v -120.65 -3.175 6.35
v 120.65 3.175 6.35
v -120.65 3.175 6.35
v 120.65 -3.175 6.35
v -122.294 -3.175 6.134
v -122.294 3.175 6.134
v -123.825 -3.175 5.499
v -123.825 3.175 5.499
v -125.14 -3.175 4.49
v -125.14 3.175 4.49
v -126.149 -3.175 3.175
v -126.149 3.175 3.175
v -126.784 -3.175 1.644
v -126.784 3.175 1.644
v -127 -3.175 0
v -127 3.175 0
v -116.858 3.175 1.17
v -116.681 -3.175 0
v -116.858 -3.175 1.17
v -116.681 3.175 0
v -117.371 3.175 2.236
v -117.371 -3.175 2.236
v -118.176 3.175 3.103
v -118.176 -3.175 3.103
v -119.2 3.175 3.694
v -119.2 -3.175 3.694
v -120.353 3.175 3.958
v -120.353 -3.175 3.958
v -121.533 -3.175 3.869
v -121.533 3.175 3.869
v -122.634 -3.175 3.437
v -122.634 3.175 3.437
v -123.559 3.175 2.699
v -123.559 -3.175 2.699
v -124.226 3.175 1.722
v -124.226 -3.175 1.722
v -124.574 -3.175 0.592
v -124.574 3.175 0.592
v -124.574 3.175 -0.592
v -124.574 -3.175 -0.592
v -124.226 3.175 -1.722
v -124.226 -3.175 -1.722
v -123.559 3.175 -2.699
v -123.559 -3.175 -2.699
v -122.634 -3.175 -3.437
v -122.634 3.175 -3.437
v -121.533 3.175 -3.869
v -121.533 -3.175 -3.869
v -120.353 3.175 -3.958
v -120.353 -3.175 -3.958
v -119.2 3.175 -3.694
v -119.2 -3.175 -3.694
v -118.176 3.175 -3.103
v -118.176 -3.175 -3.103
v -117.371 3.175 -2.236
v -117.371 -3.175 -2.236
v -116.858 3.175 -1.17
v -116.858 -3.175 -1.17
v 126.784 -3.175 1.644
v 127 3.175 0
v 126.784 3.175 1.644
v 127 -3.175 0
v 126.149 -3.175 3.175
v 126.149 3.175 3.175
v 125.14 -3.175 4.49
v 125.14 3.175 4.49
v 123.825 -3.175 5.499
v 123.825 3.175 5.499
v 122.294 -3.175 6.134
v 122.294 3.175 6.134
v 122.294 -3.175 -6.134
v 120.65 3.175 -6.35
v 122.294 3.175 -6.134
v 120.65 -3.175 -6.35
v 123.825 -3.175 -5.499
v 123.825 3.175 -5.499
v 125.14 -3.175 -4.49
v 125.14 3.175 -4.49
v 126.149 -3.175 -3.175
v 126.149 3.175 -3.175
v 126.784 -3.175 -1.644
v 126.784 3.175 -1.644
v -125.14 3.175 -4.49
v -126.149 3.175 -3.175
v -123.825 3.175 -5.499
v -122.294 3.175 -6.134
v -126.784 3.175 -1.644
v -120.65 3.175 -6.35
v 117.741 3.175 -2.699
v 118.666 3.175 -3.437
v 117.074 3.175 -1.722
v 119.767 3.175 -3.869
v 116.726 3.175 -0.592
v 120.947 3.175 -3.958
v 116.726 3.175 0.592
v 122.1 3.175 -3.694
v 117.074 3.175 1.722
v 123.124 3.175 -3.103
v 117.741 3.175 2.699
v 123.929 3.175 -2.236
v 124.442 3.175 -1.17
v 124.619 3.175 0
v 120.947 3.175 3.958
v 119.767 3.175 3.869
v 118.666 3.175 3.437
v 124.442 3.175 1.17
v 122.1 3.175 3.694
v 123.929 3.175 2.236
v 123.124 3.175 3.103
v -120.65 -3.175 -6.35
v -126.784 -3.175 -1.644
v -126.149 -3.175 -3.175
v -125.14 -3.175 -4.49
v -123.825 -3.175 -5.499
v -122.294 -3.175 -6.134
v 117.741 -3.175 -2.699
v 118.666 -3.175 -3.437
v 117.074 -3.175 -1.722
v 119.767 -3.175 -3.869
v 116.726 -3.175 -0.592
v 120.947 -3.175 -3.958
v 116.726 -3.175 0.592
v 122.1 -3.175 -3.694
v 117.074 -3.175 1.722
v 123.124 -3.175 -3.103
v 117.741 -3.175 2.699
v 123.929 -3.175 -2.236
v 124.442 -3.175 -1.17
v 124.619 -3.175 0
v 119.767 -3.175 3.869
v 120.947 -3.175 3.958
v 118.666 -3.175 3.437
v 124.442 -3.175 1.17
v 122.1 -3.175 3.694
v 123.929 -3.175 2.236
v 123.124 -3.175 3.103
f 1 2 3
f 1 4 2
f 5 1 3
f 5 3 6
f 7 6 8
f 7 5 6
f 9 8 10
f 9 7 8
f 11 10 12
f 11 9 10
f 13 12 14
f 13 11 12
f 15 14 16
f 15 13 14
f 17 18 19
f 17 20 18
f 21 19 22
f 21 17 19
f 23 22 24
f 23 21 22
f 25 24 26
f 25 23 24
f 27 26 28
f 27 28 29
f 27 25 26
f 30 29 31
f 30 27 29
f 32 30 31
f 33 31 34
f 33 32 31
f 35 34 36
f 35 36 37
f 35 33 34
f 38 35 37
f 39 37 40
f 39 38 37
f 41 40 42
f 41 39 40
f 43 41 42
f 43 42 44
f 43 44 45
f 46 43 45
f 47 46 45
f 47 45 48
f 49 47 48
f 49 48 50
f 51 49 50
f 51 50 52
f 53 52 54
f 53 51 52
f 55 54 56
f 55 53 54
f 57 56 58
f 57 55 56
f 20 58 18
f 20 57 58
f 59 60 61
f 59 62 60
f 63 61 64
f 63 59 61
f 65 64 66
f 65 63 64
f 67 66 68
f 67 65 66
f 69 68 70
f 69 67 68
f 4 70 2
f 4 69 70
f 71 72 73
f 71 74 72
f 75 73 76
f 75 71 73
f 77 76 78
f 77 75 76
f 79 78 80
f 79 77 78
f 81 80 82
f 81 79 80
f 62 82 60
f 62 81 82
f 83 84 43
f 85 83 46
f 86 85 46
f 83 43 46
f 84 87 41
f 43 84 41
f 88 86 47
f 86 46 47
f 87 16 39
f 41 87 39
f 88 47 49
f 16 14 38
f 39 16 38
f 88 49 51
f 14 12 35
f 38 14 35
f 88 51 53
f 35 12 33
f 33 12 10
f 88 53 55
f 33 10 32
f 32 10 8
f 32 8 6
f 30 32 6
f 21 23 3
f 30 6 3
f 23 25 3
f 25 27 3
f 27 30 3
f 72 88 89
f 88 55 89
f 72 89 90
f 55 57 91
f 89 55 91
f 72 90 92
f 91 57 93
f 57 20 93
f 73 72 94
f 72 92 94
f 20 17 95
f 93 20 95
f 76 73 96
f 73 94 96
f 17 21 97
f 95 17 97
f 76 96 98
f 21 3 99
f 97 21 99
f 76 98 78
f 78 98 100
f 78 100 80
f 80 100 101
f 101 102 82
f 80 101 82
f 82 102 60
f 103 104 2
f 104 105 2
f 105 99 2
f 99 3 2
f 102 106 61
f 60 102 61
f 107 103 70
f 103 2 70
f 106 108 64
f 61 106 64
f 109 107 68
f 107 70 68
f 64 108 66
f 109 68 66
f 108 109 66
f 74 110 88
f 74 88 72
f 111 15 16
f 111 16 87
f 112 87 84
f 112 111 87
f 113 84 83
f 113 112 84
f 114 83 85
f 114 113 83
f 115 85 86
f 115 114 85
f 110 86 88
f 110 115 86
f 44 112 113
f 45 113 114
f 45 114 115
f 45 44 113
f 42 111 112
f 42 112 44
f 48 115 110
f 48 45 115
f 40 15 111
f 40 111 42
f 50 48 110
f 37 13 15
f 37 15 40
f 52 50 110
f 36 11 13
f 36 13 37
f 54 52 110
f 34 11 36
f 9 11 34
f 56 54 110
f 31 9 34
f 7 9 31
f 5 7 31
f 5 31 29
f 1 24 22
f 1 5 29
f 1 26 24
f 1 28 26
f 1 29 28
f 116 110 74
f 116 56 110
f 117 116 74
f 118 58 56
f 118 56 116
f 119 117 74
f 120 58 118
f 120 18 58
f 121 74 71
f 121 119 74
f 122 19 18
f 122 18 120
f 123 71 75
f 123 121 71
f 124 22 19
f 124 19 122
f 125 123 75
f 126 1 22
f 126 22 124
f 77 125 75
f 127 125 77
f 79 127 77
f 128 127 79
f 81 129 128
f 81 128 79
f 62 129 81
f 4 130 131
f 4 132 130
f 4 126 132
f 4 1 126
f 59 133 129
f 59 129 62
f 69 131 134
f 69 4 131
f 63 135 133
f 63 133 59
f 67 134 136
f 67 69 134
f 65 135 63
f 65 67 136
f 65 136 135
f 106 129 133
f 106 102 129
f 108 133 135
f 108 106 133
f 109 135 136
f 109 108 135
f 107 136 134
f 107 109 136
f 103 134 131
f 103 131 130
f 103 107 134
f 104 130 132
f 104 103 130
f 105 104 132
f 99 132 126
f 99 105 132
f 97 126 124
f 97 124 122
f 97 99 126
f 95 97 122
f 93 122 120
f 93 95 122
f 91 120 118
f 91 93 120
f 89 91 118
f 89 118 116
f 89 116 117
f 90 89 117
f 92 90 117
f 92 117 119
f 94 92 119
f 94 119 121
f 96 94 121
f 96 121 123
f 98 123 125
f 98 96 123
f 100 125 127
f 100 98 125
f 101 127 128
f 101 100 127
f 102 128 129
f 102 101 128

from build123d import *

# Parameters (mm, degrees)
F0_R     = 3.96875
F1_DEPTH = 3.175


with BuildPart() as f1:
    # F0 (on Front) → F1 (new body, symmetric)
    with BuildSketch(Plane.XZ):
        with BuildLine():
            Line((120.65, 6.35), (-120.65, 6.35))
            ThreePointArc((-120.65, 6.35), (-125.140128, 4.490128), (-127, 0))
            ThreePointArc((-127, 0), (-125.140128, -4.490128), (-120.65, -6.35))
            Line((-120.65, -6.35), (120.65, -6.35))
            ThreePointArc((120.65, -6.35), (125.140128, -4.490128), (127, 0))
            ThreePointArc((127, 0), (125.140128, 4.490128), (120.65, 6.35))
        make_face()
        with Locations((-120.65, 0)):
            Circle(F0_R, mode=Mode.SUBTRACT)
        with Locations((120.65, 0)):
            Circle(F0_R, mode=Mode.SUBTRACT)
    extrude(amount=F1_DEPTH, both=True)


solid = f1.part
